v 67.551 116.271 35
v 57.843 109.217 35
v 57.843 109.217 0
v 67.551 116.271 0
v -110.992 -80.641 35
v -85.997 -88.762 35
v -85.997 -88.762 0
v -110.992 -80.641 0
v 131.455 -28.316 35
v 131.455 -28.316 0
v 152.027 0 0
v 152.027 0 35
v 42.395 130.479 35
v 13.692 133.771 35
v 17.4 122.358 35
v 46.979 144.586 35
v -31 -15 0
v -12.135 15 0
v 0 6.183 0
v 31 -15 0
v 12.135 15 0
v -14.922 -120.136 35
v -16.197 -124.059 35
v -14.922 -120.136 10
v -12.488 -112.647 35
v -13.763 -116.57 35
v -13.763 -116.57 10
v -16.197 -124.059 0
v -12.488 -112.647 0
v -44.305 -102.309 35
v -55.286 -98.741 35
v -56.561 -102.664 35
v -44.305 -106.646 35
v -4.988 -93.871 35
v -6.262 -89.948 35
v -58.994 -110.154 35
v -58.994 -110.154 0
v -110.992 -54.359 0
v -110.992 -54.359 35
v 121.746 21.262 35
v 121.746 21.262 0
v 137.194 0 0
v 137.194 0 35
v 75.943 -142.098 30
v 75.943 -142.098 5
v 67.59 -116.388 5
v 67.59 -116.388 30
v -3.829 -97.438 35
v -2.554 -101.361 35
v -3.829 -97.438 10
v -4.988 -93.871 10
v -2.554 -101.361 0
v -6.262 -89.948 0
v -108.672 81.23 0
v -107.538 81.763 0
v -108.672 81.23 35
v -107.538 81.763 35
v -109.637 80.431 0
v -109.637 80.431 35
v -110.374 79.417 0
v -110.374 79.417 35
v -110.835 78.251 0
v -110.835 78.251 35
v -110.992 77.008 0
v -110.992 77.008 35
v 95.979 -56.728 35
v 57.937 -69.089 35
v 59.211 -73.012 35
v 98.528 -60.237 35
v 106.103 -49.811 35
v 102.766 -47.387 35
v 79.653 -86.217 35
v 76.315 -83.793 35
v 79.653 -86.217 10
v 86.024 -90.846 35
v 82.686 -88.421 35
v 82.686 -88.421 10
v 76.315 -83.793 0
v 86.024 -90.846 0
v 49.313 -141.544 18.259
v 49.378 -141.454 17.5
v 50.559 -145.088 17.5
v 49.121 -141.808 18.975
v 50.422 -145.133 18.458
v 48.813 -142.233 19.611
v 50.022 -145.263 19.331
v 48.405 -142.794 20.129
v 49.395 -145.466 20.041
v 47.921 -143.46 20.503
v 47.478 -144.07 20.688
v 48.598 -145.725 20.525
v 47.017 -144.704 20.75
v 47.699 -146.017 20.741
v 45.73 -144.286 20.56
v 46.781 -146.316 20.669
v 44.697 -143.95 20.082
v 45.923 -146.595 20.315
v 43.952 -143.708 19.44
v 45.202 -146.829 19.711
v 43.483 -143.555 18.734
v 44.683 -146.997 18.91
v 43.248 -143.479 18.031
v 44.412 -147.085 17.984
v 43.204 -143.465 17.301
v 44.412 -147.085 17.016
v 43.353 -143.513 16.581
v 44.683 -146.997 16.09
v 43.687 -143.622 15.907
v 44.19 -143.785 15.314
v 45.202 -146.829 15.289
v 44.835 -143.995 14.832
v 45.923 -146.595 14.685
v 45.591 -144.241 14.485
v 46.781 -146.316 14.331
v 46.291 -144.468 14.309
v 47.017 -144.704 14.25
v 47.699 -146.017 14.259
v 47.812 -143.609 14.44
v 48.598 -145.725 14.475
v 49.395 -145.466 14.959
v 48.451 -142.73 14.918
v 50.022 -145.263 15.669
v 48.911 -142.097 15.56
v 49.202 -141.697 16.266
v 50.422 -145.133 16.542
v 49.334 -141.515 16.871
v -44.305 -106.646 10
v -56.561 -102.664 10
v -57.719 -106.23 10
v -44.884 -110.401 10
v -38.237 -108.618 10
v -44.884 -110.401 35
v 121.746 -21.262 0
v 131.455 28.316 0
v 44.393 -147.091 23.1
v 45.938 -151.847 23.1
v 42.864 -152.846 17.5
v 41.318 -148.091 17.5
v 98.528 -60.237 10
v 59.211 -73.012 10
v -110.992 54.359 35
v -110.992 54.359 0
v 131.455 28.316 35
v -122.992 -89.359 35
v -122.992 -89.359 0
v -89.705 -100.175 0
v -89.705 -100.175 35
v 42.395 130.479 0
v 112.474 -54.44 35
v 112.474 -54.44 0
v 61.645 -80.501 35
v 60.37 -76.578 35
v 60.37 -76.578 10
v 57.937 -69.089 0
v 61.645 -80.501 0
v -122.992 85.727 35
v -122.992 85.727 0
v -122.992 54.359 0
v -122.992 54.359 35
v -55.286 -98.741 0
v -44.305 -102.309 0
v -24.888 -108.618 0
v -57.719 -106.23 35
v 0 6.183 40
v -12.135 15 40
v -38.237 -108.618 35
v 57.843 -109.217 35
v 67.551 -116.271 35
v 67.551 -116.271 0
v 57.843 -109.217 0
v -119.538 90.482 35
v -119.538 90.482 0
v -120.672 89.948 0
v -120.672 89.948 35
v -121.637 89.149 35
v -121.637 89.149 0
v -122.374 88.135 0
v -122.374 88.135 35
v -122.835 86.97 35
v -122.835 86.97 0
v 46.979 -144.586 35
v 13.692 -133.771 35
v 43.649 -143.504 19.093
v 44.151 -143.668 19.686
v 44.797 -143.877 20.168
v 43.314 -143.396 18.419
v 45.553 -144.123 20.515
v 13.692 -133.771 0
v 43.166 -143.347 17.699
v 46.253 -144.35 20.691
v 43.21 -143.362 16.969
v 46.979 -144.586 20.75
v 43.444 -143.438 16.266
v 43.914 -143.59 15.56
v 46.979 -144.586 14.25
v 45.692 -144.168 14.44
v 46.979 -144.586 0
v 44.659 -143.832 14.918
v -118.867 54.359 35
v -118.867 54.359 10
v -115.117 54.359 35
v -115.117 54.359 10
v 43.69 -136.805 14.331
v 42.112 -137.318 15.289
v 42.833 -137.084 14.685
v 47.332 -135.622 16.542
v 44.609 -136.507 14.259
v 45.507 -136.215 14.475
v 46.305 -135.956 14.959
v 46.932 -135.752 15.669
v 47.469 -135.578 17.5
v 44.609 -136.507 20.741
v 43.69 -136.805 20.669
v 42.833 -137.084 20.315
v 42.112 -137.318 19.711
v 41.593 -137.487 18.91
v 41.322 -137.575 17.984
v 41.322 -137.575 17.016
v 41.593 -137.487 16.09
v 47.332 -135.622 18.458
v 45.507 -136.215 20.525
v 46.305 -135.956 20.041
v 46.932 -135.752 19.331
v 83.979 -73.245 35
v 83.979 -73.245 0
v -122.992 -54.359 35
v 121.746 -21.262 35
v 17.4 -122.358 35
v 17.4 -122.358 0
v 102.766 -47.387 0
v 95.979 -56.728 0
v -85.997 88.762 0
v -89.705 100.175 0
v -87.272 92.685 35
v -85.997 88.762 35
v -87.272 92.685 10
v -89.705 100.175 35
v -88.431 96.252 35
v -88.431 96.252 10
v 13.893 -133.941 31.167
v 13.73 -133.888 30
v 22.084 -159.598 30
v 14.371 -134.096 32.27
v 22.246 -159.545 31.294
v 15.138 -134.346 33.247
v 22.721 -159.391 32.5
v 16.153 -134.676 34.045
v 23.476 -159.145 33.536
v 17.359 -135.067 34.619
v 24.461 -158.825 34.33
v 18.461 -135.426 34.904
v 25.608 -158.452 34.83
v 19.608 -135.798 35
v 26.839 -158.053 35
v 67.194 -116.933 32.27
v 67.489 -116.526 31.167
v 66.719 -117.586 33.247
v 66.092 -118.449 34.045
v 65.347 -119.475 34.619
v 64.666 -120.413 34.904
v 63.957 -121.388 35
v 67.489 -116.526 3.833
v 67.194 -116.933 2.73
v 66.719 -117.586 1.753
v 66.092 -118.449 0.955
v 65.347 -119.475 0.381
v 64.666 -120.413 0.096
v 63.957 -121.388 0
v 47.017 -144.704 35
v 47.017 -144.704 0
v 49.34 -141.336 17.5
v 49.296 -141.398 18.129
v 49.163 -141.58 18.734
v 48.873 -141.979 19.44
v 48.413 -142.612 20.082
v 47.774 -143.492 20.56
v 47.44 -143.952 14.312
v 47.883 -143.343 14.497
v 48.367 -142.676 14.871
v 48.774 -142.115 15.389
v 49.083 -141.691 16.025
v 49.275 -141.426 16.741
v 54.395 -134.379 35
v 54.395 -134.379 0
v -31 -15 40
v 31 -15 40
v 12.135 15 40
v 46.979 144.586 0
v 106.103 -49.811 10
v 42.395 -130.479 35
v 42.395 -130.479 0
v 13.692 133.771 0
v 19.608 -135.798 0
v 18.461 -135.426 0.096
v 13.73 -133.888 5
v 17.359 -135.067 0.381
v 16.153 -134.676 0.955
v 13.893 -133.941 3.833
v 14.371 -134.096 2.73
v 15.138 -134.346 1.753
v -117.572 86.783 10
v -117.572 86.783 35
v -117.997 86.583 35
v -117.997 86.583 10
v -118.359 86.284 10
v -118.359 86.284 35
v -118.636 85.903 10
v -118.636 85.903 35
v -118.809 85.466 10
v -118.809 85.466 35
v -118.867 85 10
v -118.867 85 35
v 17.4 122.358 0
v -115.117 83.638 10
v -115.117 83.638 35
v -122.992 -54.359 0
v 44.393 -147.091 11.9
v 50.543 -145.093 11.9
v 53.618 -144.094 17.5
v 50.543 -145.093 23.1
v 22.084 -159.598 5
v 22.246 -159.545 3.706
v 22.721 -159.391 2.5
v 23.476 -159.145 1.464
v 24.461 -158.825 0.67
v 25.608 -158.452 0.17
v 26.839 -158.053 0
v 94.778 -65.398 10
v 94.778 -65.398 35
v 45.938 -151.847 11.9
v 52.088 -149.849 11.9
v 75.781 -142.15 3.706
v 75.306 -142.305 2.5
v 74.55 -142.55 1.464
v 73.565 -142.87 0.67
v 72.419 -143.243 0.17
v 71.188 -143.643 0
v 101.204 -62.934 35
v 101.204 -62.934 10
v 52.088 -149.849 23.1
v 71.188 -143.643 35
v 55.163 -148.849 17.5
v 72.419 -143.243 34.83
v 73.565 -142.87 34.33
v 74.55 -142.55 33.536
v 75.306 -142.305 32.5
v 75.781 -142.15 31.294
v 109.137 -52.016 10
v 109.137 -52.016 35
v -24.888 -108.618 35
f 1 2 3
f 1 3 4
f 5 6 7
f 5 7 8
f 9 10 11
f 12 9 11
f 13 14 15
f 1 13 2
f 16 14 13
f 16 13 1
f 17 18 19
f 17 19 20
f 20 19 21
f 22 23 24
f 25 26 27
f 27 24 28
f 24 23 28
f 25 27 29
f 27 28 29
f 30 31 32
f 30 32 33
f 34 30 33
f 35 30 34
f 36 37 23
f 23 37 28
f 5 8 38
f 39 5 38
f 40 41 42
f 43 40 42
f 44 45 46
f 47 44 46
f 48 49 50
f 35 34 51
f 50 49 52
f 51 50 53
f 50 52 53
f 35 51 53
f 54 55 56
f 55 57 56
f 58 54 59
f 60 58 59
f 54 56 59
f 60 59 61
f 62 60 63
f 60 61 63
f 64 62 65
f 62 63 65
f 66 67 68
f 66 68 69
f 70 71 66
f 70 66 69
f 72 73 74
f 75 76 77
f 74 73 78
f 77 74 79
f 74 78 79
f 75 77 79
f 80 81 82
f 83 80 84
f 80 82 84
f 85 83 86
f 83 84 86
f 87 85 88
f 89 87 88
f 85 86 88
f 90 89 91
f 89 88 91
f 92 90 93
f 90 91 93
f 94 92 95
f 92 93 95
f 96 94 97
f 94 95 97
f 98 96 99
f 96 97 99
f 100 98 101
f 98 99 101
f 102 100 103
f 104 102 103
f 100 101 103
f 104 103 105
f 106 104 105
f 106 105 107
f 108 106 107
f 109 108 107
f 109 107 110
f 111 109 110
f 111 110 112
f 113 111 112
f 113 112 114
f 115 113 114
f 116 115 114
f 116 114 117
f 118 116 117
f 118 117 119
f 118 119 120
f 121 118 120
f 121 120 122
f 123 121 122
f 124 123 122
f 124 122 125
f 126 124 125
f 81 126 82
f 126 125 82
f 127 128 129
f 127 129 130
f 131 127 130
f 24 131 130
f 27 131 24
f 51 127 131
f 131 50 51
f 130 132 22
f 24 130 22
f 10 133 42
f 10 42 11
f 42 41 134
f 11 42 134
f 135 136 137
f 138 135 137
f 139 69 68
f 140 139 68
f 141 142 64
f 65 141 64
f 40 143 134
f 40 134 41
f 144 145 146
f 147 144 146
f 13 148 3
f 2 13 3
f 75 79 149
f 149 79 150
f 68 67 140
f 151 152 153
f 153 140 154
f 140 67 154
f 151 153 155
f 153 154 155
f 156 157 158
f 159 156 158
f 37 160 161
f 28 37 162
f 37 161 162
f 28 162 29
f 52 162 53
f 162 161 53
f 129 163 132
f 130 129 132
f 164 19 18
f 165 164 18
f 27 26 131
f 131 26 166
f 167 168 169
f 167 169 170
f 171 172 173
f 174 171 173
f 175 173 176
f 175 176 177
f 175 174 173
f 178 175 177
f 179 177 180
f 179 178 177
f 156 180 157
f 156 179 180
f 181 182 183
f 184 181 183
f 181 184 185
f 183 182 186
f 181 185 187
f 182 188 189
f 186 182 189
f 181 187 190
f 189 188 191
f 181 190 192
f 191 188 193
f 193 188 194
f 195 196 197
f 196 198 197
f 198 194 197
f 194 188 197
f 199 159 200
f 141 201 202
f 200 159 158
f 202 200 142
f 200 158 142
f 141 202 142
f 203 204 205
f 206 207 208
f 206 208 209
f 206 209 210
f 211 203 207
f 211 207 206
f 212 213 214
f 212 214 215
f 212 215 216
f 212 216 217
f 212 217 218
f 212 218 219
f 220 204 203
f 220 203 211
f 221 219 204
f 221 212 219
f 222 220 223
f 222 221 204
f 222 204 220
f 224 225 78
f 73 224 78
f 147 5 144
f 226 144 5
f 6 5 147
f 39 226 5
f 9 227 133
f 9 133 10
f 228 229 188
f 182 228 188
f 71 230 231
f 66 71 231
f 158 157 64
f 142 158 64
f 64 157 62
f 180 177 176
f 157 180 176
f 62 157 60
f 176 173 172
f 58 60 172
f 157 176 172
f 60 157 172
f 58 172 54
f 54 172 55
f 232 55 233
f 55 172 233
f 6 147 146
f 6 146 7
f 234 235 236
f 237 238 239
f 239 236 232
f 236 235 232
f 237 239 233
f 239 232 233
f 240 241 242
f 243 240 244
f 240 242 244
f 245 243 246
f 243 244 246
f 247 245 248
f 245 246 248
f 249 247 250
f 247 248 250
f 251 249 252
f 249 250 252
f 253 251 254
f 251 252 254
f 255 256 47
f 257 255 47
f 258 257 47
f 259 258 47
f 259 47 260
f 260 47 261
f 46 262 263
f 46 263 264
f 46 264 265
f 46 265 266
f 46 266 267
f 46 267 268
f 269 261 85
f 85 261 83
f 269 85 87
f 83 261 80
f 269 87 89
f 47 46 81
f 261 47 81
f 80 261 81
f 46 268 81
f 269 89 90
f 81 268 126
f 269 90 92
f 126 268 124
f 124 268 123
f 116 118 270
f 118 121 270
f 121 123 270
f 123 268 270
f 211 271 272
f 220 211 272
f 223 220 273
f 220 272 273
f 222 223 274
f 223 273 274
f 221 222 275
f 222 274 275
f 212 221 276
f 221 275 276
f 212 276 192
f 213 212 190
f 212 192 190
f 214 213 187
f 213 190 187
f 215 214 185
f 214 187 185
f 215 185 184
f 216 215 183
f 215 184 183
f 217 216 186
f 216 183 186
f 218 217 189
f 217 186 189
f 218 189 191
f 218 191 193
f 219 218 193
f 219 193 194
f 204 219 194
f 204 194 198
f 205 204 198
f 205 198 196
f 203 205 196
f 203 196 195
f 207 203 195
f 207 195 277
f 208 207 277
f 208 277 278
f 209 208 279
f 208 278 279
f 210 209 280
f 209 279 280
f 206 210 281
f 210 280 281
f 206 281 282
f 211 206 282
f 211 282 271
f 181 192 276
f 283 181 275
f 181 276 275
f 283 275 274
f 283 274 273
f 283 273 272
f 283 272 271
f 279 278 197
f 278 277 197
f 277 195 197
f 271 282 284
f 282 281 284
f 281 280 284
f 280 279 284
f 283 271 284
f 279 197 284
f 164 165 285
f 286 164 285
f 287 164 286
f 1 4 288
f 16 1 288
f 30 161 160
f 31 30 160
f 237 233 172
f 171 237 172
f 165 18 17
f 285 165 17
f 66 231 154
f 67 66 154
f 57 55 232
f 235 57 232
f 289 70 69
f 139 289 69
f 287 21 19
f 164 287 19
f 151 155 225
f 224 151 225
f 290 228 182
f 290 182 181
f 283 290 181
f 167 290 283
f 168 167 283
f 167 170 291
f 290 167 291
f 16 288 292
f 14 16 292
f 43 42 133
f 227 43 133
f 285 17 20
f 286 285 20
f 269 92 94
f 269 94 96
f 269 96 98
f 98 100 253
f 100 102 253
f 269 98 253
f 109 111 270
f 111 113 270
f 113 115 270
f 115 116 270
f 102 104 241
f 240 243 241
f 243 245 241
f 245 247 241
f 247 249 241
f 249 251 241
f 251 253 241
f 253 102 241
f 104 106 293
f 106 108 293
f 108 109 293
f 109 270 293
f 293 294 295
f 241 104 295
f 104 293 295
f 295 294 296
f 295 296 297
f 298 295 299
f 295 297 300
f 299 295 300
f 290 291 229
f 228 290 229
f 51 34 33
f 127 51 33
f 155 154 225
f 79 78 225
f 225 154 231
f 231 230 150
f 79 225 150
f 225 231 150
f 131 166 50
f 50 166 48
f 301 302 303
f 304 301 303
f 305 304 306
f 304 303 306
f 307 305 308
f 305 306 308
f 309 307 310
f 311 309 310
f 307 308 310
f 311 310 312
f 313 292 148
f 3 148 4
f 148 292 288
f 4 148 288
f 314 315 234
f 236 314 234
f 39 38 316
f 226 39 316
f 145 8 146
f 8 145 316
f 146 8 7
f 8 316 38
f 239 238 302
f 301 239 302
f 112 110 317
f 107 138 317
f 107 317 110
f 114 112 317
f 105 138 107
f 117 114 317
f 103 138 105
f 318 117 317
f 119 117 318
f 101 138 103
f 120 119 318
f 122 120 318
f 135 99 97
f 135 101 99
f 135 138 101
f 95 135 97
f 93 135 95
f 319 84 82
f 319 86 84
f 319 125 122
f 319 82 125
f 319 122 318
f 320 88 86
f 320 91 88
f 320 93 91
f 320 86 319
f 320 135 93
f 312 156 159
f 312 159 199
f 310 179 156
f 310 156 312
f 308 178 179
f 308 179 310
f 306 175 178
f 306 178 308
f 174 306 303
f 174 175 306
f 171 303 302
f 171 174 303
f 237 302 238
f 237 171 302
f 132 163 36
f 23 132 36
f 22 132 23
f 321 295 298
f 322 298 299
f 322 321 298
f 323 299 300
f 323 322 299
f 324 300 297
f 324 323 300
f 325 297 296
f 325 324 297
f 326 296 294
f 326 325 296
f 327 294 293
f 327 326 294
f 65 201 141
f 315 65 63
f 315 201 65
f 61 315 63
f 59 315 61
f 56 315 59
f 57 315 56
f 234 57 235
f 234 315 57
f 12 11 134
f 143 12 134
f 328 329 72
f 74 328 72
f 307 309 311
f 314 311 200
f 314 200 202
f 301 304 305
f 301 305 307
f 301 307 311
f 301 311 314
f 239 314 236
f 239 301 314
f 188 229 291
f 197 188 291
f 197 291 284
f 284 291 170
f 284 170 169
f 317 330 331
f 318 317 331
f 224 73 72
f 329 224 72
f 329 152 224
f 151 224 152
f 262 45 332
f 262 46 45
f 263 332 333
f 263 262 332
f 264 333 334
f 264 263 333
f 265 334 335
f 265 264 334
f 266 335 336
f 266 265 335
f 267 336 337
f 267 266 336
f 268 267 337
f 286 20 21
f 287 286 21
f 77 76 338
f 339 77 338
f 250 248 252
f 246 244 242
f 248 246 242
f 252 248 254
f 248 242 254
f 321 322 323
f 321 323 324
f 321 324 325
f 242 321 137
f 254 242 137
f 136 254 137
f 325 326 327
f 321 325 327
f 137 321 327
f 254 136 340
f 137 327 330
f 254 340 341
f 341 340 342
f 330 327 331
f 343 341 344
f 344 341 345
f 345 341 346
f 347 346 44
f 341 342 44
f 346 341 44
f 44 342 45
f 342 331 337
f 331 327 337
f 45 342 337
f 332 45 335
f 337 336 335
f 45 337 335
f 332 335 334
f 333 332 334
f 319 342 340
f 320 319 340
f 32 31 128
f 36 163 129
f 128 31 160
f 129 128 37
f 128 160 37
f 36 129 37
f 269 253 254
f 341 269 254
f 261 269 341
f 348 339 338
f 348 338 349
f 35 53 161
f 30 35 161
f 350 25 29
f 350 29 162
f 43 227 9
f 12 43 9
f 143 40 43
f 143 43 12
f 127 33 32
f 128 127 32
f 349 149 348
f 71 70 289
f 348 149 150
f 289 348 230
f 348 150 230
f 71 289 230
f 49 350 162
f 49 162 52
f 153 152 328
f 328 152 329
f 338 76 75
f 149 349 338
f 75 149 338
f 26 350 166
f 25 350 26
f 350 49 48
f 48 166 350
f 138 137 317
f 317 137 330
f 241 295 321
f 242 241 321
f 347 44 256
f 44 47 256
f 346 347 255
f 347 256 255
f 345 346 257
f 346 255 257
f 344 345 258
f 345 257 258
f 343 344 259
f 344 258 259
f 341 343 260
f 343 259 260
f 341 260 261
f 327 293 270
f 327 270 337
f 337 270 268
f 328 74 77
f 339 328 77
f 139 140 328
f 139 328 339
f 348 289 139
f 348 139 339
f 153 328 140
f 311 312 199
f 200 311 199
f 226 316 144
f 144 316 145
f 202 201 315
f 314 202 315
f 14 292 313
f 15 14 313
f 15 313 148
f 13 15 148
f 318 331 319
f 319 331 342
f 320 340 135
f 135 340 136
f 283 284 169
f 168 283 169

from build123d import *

# Parameters (mm, degrees)
F1_DEPTH  = 35
F3_DEPTH  = 25
F4_R      = 5
F6_DEPTH  = 25
F8_DEPTH  = 25
F9_R      = 5
F12_DEPTH = 5
F11_R     = 3.25
F13_DEPTH = 15
F15_DEPTH = 40


with BuildPart() as f1:
    # F0 (on Top) → F1 (new body)
    with BuildSketch(Plane.XY):
        Polygon((-89.7054851697, 100.1748499712), (-122.99246324, 89.359255168), (-122.99246324, 54.359255168), (-110.99246324, 54.359255168), (-110.99246324, 80.640744832), (-85.9972812372, 88.7621717756), align=None)
    extrude(amount=F1_DEPTH)


with BuildPart() as f1b:
    # F0 (on Top) → F1, piece 2 (new body)
    with BuildSketch(Plane.XY):
        Polygon((-89.7054851697, -100.1748499712), (-85.9972812372, -88.7621717756), (-110.99246324, -80.640744832), (-110.99246324, -54.359255168), (-122.99246324, -54.359255168), (-122.99246324, -89.359255168), align=None)
    extrude(amount=F1_DEPTH)


with BuildPart() as f1c:
    # F0 (on Top) → F1, piece 3 (new body)
    with BuildSketch(Plane.XY):
        Polygon((54.3953484626, -134.378502371), (67.5514244279, -116.2707172681), (57.8432204954, -109.2172942406), (42.3953484626, -130.4794660162), (17.4001664598, -122.3580390726), (13.6919625273, -133.7707172681), (46.9789405976, -144.5863120713), align=None)
    extrude(amount=F1_DEPTH)


with BuildPart() as f1d:
    # F0 (on Top) → F1, piece 4 (new body)
    with BuildSketch(Plane.XY):
        Polygon((131.4545614546, 28.3155948031), (121.7463575221, 21.2621717756), (137.1942295548, 0), (121.7463575221, -21.2621717756), (131.4545614546, -28.3155948031), (152.0270452848, 0), align=None)
    extrude(amount=F1_DEPTH)


with BuildPart() as f1e:
    # F0 (on Top) → F1, piece 5 (new body)
    with BuildSketch(Plane.XY):
        Polygon((67.5514244279, 116.2707172681), (46.9789405976, 144.5863120713), (13.6919625273, 133.7707172681), (17.4001664598, 122.3580390726), (42.3953484626, 130.4794660162), (57.8432204954, 109.2172942406), align=None)
    extrude(amount=F1_DEPTH)


with BuildPart() as f1f:
    # F0 (on Top) → F1, piece 6 (new body)
    with BuildSketch(Plane.XY):
        Polygon((-58.9940718149, -110.1535930693), (-16.1965285816, -124.0593578161), (-12.4883246491, -112.6466796206), (-24.8883169861, -108.6176778772), (-2.5542602668, -101.3609029523), (-6.2624641993, -89.9482247568), (-44.3047248511, -102.3089045318), (-55.2858678824, -98.7409148737), align=None)
    extrude(amount=F1_DEPTH)


with BuildPart() as f1g:
    # F0 (on Top) → F1, piece 7 (new body)
    with BuildSketch(Plane.XY):
        Polygon((112.4738641588, -54.440283399), (102.7656602263, -47.3868603715), (95.9789405976, -56.7279785677), (57.9366799458, -69.0886583427), (61.6448838783, -80.5013365383), (83.9789405976, -73.2445616134), (76.3153238731, -83.7926251184), (86.0235278056, -90.8460481459), align=None)
    extrude(amount=F1_DEPTH)


with BuildPart() as f1h:
    # F0 (on Top) → F1, piece 8 (new body)
    with BuildSketch(Plane.XY):
        Polygon((13.7301591284, -133.8882743186), (22.0836515011, -159.5976802719), (75.9431134017, -142.0976802719), (67.589621029, -116.3882743186), (47.0171371988, -144.7038691217), align=None)
    extrude(amount=F1_DEPTH)

    # F9
    f9_edges = [f1h.edges().sort_by_distance(p)[0] for p in [
        (17.906905, -146.742977, 0),
        (17.906905, -146.742977, 35),
        (71.766367, -129.242977, 35),
        (71.766367, -129.242977, 0),
    ]]
    fillet(f9_edges, radius=F9_R)

    # F10 (on face) → F12 (cut)
    with BuildSketch(Plane(origin=(49.0133824514, -150.8476802719, 0), x_dir=(0.9510565163, 0.3090169944, 0), z_dir=(0.3090169944, -0.9510565163, 0))):
        Polygon((3.2331615075, 23.1), (-3.2331615075, 23.1), (-6.4663230149, 17.5), (-3.2331615075, 11.9), (3.2331615075, 11.9), (6.4663230149, 17.5), align=None)
    extrude(amount=-F12_DEPTH, mode=Mode.SUBTRACT)


with BuildPart() as f3_tool:
    # F2 (on face) → F3 (new body)
    with BuildSketch(Plane.XY.offset(35)):
        with BuildLine():
            Line((-38.2370973933, -108.6176778772), (-41.2709111222, -109.6034237124))
            Line((-41.2709111222, -109.6034237124), (-43.7253179867, -110.4009088452))
            ThreePointArc((-43.7253179867, -110.4009088452), (-44.3047247368, -110.4926778772), (-44.8841314982, -110.4009089159))
            Line((-44.8841314982, -110.4009089159), (-1.672213686, -124.441312125))
            ThreePointArc((-1.672213686, -124.441312125), (0.6904241465, -123.2374880214), (-0.5133999571, -120.8748501889))
            Line((-0.5133999571, -120.8748501889), (-38.2370973933, -108.6176778772))
        make_face()
        with BuildLine():
            ThreePointArc((-44.8841314982, -110.4009089159), (-45.9753620321, -109.468910166), (-46.0879558192, -108.0382710127))
            ThreePointArc((-46.0879558192, -108.0382710127), (-45.6305500658, -107.2918526625), (-44.8841317156, -106.8344469091))
            Line((-44.8841317156, -106.8344469091), (-44.3047248511, -106.6461862067))
            Line((-44.3047248511, -106.6461862067), (-66.3806738585, -99.4732755612))
            ThreePointArc((-66.3806738585, -99.4732755612), (-68.743311691, -100.6770996648), (-67.5394875874, -103.0397374973))
            Line((-67.5394875874, -103.0397374973), (-44.8841314982, -110.4009089159))
        make_face()
        with BuildLine():
            Line((111.5647467268, -42.2938259644), (98.5283308012, -60.2369131522))
            Line((98.5283308012, -60.2369131522), (99.1077376657, -60.0486524498))
            ThreePointArc((99.1077376657, -60.0486524498), (99.9804591521, -59.9799677792), (100.7892418782, -60.3149765534))
            ThreePointArc((100.7892418782, -60.3149765534), (101.5390601695, -61.5385688005), (101.2040513891, -62.9339807735))
            Line((101.2040513891, -62.9339807735), (114.5985604557, -44.4980206605))
            ThreePointArc((114.5985604557, -44.4980206605), (114.1837509393, -41.879016448), (111.5647467268, -42.2938259644))
        make_face()
        with BuildLine():
            Line((97.8121445301, -64.4125995187), (94.7783308012, -65.3983453539))
            Line((94.7783308012, -65.3983453539), (75.5809337275, -91.8212956063))
            ThreePointArc((75.5809337275, -91.8212956063), (75.9957432439, -94.4402998188), (78.6147474564, -94.0254903024))
            Line((78.6147474564, -94.0254903024), (101.2040513891, -62.9339807735))
            ThreePointArc((101.2040513891, -62.9339807735), (100.7892418744, -63.348790285), (100.2665513946, -63.6151143859))
            Line((100.2665513946, -63.6151143859), (97.8121445301, -64.4125995187))
        make_face()
        with BuildLine():
            Line((-116.99246324, 85), (-116.99246324, 83.125))
            ThreePointArc((-116.99246324, 83.125), (-116.6991486181, 83.1480843614), (-116.4130563756, 83.2167690319))
            Line((-116.4130563756, 83.2167690319), (-115.11746324, 83.63773276))
            Line((-115.11746324, 83.63773276), (-115.11746324, 85))
            ThreePointArc((-115.11746324, 85), (-115.1405476014, 85.293314622), (-115.209232272, 85.5794068645))
            Line((-115.209232272, 85.5794068645), (-116.99246324, 85))
        make_face()
        Polygon((-44.3047248511, -106.6461862067), (-41.2709111222, -107.631932042), (96.6533308012, -62.8176292531), (98.5283308012, -60.2369131522), align=None)
        with BuildLine():
            ThreePointArc((-118.86746324, 85), (-118.3182884548, 83.6741747853), (-116.99246324, 83.125))
            Line((-116.99246324, 83.125), (-116.99246324, 85))
            Line((-116.99246324, 85), (-115.209232272, 85.5794068645))
            ThreePointArc((-115.209232272, 85.5794068645), (-116.141231053, 86.6706372329), (-117.5718701045, 86.7832309681))
            ThreePointArc((-117.5718701045, 86.7832309681), (-118.5093701045, 86.102097348), (-118.86746324, 85))
        make_face()
        with BuildLine():
            Line((-46.0879558192, -108.0382710127), (-44.3047248511, -108.6176778772))
            Line((-44.3047248511, -108.6176778772), (-41.2709111222, -107.631932042))
            Line((-41.2709111222, -107.631932042), (-44.3047248511, -106.6461862067))
            Line((-44.3047248511, -106.6461862067), (-44.8841317156, -106.8344469091))
            ThreePointArc((-44.8841317156, -106.8344469091), (-45.6305500658, -107.2918526625), (-46.0879558192, -108.0382710127))
        make_face()
        Polygon((-41.2709111222, -107.631932042), (-44.3047248511, -108.6176778772), (-41.2709111222, -109.6034237124), (-38.2370973933, -108.6176778772), align=None)
        with BuildLine():
            Line((98.5283308012, -60.2369131522), (96.6533308012, -62.8176292531))
            Line((96.6533308012, -62.8176292531), (99.6871445301, -61.8318834178))
            Line((99.6871445301, -61.8318834178), (100.7892418782, -60.3149765534))
            ThreePointArc((100.7892418782, -60.3149765534), (99.9804591521, -59.9799677792), (99.1077376657, -60.0486524498))
            Line((99.1077376657, -60.0486524498), (98.5283308012, -60.2369131522))
        make_face()
        Polygon((99.6871445301, -61.8318834178), (96.6533308012, -62.8176292531), (94.7783308012, -65.3983453539), (97.8121445301, -64.4125995187), align=None)
        with BuildLine():
            Line((100.7892418782, -60.3149765534), (99.6871445301, -61.8318834178))
            Line((99.6871445301, -61.8318834178), (97.8121445301, -64.4125995187))
            Line((97.8121445301, -64.4125995187), (100.2665513946, -63.6151143859))
            ThreePointArc((100.2665513946, -63.6151143859), (100.7892418744, -63.348790285), (101.2040513891, -62.9339807735))
            ThreePointArc((101.2040513891, -62.9339807735), (101.5390601695, -61.5385688005), (100.7892418782, -60.3149765534))
        make_face()
        with BuildLine():
            Line((-41.2709111222, -109.6034237124), (-44.3047248511, -108.6176778772))
            Line((-44.3047248511, -108.6176778772), (-46.0879558192, -108.0382710127))
            ThreePointArc((-46.0879558192, -108.0382710127), (-45.9753620321, -109.468910166), (-44.8841314982, -110.4009089159))
            ThreePointArc((-44.8841314982, -110.4009089159), (-44.3047247368, -110.4926778772), (-43.7253179867, -110.4009088452))
            Line((-43.7253179867, -110.4009088452), (-41.2709111222, -109.6034237124))
        make_face()
        with BuildLine():
            Line((-118.86746324, 54.359255168), (-116.99246324, 54.359255168))
            Line((-116.99246324, 54.359255168), (-116.99246324, 83.125))
            ThreePointArc((-116.99246324, 83.125), (-118.3182884548, 83.6741747853), (-118.86746324, 85))
            Line((-118.86746324, 85), (-118.86746324, 54.359255168))
        make_face()
        with BuildLine():
            Line((-116.99246324, 83.125), (-116.99246324, 54.359255168))
            Line((-116.99246324, 54.359255168), (-115.11746324, 54.359255168))
            Line((-115.11746324, 54.359255168), (-115.11746324, 83.63773276))
            Line((-115.11746324, 83.63773276), (-116.4130563756, 83.2167690319))
            ThreePointArc((-116.4130563756, 83.2167690319), (-116.6991486181, 83.1480843614), (-116.99246324, 83.125))
        make_face()
        with BuildLine():
            ThreePointArc((-117.5718701045, 86.7832309681), (-116.141231053, 86.6706372329), (-115.209232272, 85.5794068645))
            Line((-115.209232272, 85.5794068645), (-87.8513832035, 94.4685108734))
            Line((-87.8513832035, 94.4685108734), (-88.4307900679, 96.2517418414))
            Line((-88.4307900679, 96.2517418414), (-117.5718701045, 86.7832309681))
        make_face()
        with BuildLine():
            Line((-115.11746324, 85), (-115.11746324, 83.63773276))
            Line((-115.11746324, 83.63773276), (-87.271976339, 92.6852799053))
            Line((-87.271976339, 92.6852799053), (-87.8513832035, 94.4685108734))
            Line((-87.8513832035, 94.4685108734), (-115.209232272, 85.5794068645))
            ThreePointArc((-115.209232272, 85.5794068645), (-115.1405476014, 85.293314622), (-115.11746324, 85))
        make_face()
        with BuildLine():
            Line((-115.11746324, 54.359255168), (-116.99246324, 54.359255168))
            Line((-116.99246324, 54.359255168), (-118.86746324, 54.359255168))
            ThreePointArc((-118.86746324, 54.359255168), (-116.99246324, 52.484255168), (-115.11746324, 54.359255168))
        make_face()
        with BuildLine():
            Line((-87.8513832035, 94.4685108734), (-87.271976339, 92.6852799053))
            ThreePointArc((-87.271976339, 92.6852799053), (-86.0681522354, 95.0479177378), (-88.4307900679, 96.2517418414))
            Line((-88.4307900679, 96.2517418414), (-87.8513832035, 94.4685108734))
        make_face()
    extrude(amount=-F3_DEPTH)


with BuildPart() as f1_1:
    add(f1.part)

    # F3: cut by f3_tool
    add(f3_tool.part, mode=Mode.SUBTRACT)

    # F4
    f4_edges = [f1_1.edges().sort_by_distance(p)[0] for p in [
        (-110.992463, 80.640745, 17.5),
        (-122.992463, 89.359255, 17.5),
    ]]
    fillet(f4_edges, radius=F4_R)

    # F7 (on face) → F8 (cut)
    with BuildSketch(Plane.XY.offset(35)):
        with BuildLine():
            Line((97.8121445301, -64.4125995187), (94.7783308012, -65.3983453539))
            Line((94.7783308012, -65.3983453539), (79.6525189749, -86.2172392841))
            Line((79.6525189749, -86.2172392841), (75.6043512253, -91.7890641857))
            ThreePointArc((75.6043512253, -91.7890641857), (76.0191607417, -94.4080683982), (78.6381649542, -93.9932588818))
            Line((78.6381649542, -93.9932588818), (101.2040513891, -62.9339807735))
            ThreePointArc((101.2040513891, -62.9339807735), (100.7892418744, -63.348790285), (100.2665513946, -63.6151143859))
            Line((100.2665513946, -63.6151143859), (97.8121445301, -64.4125995187))
        make_face()
        Polygon((99.6871445301, -61.8318834178), (96.6533308012, -62.8176292531), (94.7783308012, -65.3983453539), (97.8121445301, -64.4125995187), align=None)
        Polygon((-44.5022110645, -106.7103533672), (-41.4683973356, -107.6960992024), (96.6533308012, -62.8176292531), (98.5283308012, -60.2369131522), align=None)
        with BuildLine():
            Line((98.5283308012, -60.2369131522), (96.6533308012, -62.8176292531))
            Line((96.6533308012, -62.8176292531), (99.6871445301, -61.8318834178))
            Line((99.6871445301, -61.8318834178), (100.7892418782, -60.3149765534))
            ThreePointArc((100.7892418782, -60.3149765534), (99.9804591521, -59.9799677792), (99.1077376657, -60.0486524498))
            Line((99.1077376657, -60.0486524498), (98.5283308012, -60.2369131522))
        make_face()
        with BuildLine():
            Line((111.5881642246, -42.2615945438), (98.5283308012, -60.2369131522))
            Line((98.5283308012, -60.2369131522), (99.1077376657, -60.0486524498))
            ThreePointArc((99.1077376657, -60.0486524498), (99.9804591521, -59.9799677792), (100.7892418782, -60.3149765534))
            ThreePointArc((100.7892418782, -60.3149765534), (101.5390601695, -61.5385688005), (101.2040513891, -62.9339807735))
            Line((101.2040513891, -62.9339807735), (114.6219779535, -44.4657892399))
            ThreePointArc((114.6219779535, -44.4657892399), (114.2071684371, -41.8467850274), (111.5881642246, -42.2615945438))
        make_face()
        with BuildLine():
            Line((100.7892418782, -60.3149765534), (99.6871445301, -61.8318834178))
            Line((99.6871445301, -61.8318834178), (97.8121445301, -64.4125995187))
            Line((97.8121445301, -64.4125995187), (100.2665513946, -63.6151143859))
            ThreePointArc((100.2665513946, -63.6151143859), (100.7892418744, -63.348790285), (101.2040513891, -62.9339807735))
            ThreePointArc((101.2040513891, -62.9339807735), (101.5390601695, -61.5385688005), (100.7892418782, -60.3149765534))
        make_face()
        Polygon((96.6533308012, -62.8176292531), (-41.4683973356, -107.6960992024), (-38.4345836067, -108.6818450377), (60.3701887765, -76.5782284085), (94.7783308012, -65.3983453539), align=None)
    extrude(amount=-F8_DEPTH, mode=Mode.SUBTRACT)


with BuildPart() as f1f_1:
    add(f1f.part)

    # F3: cut by f3_tool
    add(f3_tool.part, mode=Mode.SUBTRACT)


with BuildPart() as f1g_1:
    add(f1g.part)

    # F3: cut by f3_tool
    add(f3_tool.part, mode=Mode.SUBTRACT)


with BuildPart() as f6_tool:
    # F5 (on face) → F6 (new body)
    with BuildSketch(Plane.XY.offset(35)):
        with BuildLine():
            ThreePointArc((-44.8841315729, -110.4009088916), (-45.9753620499, -109.4689101311), (-46.0879558192, -108.0382710127))
            ThreePointArc((-46.0879558192, -108.0382710127), (-45.6305500658, -107.2918526625), (-44.8841317156, -106.8344469091))
            Line((-44.8841317156, -106.8344469091), (-44.3047248511, -106.6461862067))
            Line((-44.3047248511, -106.6461862067), (-66.8842523844, -99.3096529795))
            ThreePointArc((-66.8842523844, -99.3096529795), (-69.2468902169, -100.5134770831), (-68.0430661133, -102.8761149157))
            Line((-68.0430661133, -102.8761149157), (-44.8841315729, -110.4009088916))
        make_face()
        with BuildLine():
            Line((-41.2709111222, -109.6034237124), (-44.3047248511, -108.6176778772))
            Line((-44.3047248511, -108.6176778772), (-46.0879558192, -108.0382710127))
            ThreePointArc((-46.0879558192, -108.0382710127), (-45.9753620499, -109.4689101311), (-44.8841315729, -110.4009088916))
            ThreePointArc((-44.8841315729, -110.4009088916), (-44.3047247761, -110.4926778772), (-43.7253179867, -110.4009088452))
            Line((-43.7253179867, -110.4009088452), (-41.2709111222, -109.6034237124))
        make_face()
        with BuildLine():
            Line((-46.0879558192, -108.0382710127), (-44.3047248511, -108.6176778772))
            Line((-44.3047248511, -108.6176778772), (-41.2709111222, -107.631932042))
            Line((-41.2709111222, -107.631932042), (-44.3047248511, -106.6461862067))
            Line((-44.3047248511, -106.6461862067), (-44.8841317156, -106.8344469091))
            ThreePointArc((-44.8841317156, -106.8344469091), (-45.6305500658, -107.2918526625), (-46.0879558192, -108.0382710127))
        make_face()
        Polygon((-41.2709111222, -107.631932042), (-44.3047248511, -108.6176778772), (-41.2709111222, -109.6034237124), (-38.2370973933, -108.6176778772), align=None)
        Polygon((-44.3047248511, -106.6461862067), (-41.2709111222, -107.631932042), (-4.4083622331, -95.6545638545), (96.6533308012, -62.8176292531), (98.5283308012, -60.2369131522), align=None)
        Polygon((-4.4083622331, -95.6545638545), (-41.2709111222, -107.631932042), (-38.2370973933, -108.6176778772), (-3.8289553686, -97.4377948226), align=None)
        with BuildLine():
            Line((-38.2370973933, -108.6176778772), (-41.2709111222, -109.6034237124))
            Line((-41.2709111222, -109.6034237124), (-43.7253179867, -110.4009088452))
            ThreePointArc((-43.7253179867, -110.4009088452), (-44.3047247761, -110.4926778772), (-44.8841315729, -110.4009088916))
            Line((-44.8841315729, -110.4009088916), (-2.1757922119, -124.2776895434))
            ThreePointArc((-2.1757922119, -124.2776895434), (0.1868456206, -123.0738654398), (-1.016978483, -120.7112276073))
            Line((-1.016978483, -120.7112276073), (-13.7630197509, -116.5697877503))
            Line((-13.7630197509, -116.5697877503), (-38.2370973933, -108.6176778772))
        make_face()
        Polygon((96.6533308012, -62.8176292531), (-4.4083622331, -95.6545638545), (-3.8289553686, -97.4377948226), (94.7783308012, -65.3983453539), align=None)
        with BuildLine():
            Line((100.7892418782, -60.3149765534), (99.6871445301, -61.8318834178))
            Line((99.6871445301, -61.8318834178), (97.8121445301, -64.4125995187))
            Line((97.8121445301, -64.4125995187), (100.2665513946, -63.6151143859))
            ThreePointArc((100.2665513946, -63.6151143859), (100.7892419327, -63.3487902427), (101.2040514738, -62.9339806568))
            ThreePointArc((101.2040514738, -62.9339806568), (101.5390601582, -61.5385687293), (100.7892418782, -60.3149765534))
        make_face()
        with BuildLine():
            Line((98.5283308012, -60.2369131522), (96.6533308012, -62.8176292531))
            Line((96.6533308012, -62.8176292531), (99.6871445301, -61.8318834178))
            Line((99.6871445301, -61.8318834178), (100.7892418782, -60.3149765534))
            ThreePointArc((100.7892418782, -60.3149765534), (99.9804591521, -59.9799677792), (99.1077376657, -60.0486524498))
            Line((99.1077376657, -60.0486524498), (98.5283308012, -60.2369131522))
        make_face()
        Polygon((99.6871445301, -61.8318834178), (96.6533308012, -62.8176292531), (94.7783308012, -65.3983453539), (97.8121445301, -64.4125995187), align=None)
        with BuildLine():
            Line((97.8121445301, -64.4125995187), (94.7783308012, -65.3983453539))
            Line((94.7783308012, -65.3983453539), (75.4062468998, -92.0617313977))
            ThreePointArc((75.4062468998, -92.0617313977), (75.8210564162, -94.6807356102), (78.4400606287, -94.2659260938))
            Line((78.4400606287, -94.2659260938), (101.2040514738, -62.9339806568))
            ThreePointArc((101.2040514738, -62.9339806568), (100.7892419327, -63.3487902427), (100.2665513946, -63.6151143859))
            Line((100.2665513946, -63.6151143859), (97.8121445301, -64.4125995187))
        make_face()
        with BuildLine():
            Line((111.3900598991, -42.5342617558), (98.5283308012, -60.2369131522))
            Line((98.5283308012, -60.2369131522), (99.1077376657, -60.0486524498))
            ThreePointArc((99.1077376657, -60.0486524498), (99.9804591521, -59.9799677792), (100.7892418782, -60.3149765534))
            ThreePointArc((100.7892418782, -60.3149765534), (101.5390601582, -61.5385687293), (101.2040514738, -62.9339806568))
            Line((101.2040514738, -62.9339806568), (114.423873628, -44.7384564519))
            ThreePointArc((114.423873628, -44.7384564519), (114.0090641116, -42.1194522394), (111.3900598991, -42.5342617558))
        make_face()
    extrude(amount=-F6_DEPTH)


with BuildPart() as f1f_2:
    add(f1f_1.part)

    # F6: cut by f6_tool
    add(f6_tool.part, mode=Mode.SUBTRACT)


with BuildPart() as f1g_2:
    add(f1g_1.part)

    # F6: cut by f6_tool
    add(f6_tool.part, mode=Mode.SUBTRACT)


with BuildPart() as f13_tool:
    # F11 (on face) → F13 (new body)
    with BuildSketch(Plane(origin=(49.0133824514, -150.8476802719, 0), x_dir=(0.9510565163, 0.3090169944, 0), z_dir=(0.3090169944, -0.9510565163, 0))):
        with Locations((0, 17.5)):
            Circle(F11_R)
    extrude(amount=-F13_DEPTH)


with BuildPart() as f1c_1:
    add(f1c.part)

    # F13: cut by f13_tool
    add(f13_tool.part, mode=Mode.SUBTRACT)


with BuildPart() as f1h_1:
    add(f1h.part)

    # F13: cut by f13_tool
    add(f13_tool.part, mode=Mode.SUBTRACT)


with BuildPart() as f15:
    # F14 (on Top) → F15 (new body)
    with BuildSketch(Plane.XY):
        Polygon((-31, -15), (31, -15), (12.1352549156, 15), (0, 6.1832212156), (-12.1352549156, 15), align=None)
    extrude(amount=F15_DEPTH)


solid = Compound([f1b.part, f1d.part, f1e.part, f1_1.part, f1f_2.part, f1g_2.part, f1c_1.part, f1h_1.part, f15.part])
